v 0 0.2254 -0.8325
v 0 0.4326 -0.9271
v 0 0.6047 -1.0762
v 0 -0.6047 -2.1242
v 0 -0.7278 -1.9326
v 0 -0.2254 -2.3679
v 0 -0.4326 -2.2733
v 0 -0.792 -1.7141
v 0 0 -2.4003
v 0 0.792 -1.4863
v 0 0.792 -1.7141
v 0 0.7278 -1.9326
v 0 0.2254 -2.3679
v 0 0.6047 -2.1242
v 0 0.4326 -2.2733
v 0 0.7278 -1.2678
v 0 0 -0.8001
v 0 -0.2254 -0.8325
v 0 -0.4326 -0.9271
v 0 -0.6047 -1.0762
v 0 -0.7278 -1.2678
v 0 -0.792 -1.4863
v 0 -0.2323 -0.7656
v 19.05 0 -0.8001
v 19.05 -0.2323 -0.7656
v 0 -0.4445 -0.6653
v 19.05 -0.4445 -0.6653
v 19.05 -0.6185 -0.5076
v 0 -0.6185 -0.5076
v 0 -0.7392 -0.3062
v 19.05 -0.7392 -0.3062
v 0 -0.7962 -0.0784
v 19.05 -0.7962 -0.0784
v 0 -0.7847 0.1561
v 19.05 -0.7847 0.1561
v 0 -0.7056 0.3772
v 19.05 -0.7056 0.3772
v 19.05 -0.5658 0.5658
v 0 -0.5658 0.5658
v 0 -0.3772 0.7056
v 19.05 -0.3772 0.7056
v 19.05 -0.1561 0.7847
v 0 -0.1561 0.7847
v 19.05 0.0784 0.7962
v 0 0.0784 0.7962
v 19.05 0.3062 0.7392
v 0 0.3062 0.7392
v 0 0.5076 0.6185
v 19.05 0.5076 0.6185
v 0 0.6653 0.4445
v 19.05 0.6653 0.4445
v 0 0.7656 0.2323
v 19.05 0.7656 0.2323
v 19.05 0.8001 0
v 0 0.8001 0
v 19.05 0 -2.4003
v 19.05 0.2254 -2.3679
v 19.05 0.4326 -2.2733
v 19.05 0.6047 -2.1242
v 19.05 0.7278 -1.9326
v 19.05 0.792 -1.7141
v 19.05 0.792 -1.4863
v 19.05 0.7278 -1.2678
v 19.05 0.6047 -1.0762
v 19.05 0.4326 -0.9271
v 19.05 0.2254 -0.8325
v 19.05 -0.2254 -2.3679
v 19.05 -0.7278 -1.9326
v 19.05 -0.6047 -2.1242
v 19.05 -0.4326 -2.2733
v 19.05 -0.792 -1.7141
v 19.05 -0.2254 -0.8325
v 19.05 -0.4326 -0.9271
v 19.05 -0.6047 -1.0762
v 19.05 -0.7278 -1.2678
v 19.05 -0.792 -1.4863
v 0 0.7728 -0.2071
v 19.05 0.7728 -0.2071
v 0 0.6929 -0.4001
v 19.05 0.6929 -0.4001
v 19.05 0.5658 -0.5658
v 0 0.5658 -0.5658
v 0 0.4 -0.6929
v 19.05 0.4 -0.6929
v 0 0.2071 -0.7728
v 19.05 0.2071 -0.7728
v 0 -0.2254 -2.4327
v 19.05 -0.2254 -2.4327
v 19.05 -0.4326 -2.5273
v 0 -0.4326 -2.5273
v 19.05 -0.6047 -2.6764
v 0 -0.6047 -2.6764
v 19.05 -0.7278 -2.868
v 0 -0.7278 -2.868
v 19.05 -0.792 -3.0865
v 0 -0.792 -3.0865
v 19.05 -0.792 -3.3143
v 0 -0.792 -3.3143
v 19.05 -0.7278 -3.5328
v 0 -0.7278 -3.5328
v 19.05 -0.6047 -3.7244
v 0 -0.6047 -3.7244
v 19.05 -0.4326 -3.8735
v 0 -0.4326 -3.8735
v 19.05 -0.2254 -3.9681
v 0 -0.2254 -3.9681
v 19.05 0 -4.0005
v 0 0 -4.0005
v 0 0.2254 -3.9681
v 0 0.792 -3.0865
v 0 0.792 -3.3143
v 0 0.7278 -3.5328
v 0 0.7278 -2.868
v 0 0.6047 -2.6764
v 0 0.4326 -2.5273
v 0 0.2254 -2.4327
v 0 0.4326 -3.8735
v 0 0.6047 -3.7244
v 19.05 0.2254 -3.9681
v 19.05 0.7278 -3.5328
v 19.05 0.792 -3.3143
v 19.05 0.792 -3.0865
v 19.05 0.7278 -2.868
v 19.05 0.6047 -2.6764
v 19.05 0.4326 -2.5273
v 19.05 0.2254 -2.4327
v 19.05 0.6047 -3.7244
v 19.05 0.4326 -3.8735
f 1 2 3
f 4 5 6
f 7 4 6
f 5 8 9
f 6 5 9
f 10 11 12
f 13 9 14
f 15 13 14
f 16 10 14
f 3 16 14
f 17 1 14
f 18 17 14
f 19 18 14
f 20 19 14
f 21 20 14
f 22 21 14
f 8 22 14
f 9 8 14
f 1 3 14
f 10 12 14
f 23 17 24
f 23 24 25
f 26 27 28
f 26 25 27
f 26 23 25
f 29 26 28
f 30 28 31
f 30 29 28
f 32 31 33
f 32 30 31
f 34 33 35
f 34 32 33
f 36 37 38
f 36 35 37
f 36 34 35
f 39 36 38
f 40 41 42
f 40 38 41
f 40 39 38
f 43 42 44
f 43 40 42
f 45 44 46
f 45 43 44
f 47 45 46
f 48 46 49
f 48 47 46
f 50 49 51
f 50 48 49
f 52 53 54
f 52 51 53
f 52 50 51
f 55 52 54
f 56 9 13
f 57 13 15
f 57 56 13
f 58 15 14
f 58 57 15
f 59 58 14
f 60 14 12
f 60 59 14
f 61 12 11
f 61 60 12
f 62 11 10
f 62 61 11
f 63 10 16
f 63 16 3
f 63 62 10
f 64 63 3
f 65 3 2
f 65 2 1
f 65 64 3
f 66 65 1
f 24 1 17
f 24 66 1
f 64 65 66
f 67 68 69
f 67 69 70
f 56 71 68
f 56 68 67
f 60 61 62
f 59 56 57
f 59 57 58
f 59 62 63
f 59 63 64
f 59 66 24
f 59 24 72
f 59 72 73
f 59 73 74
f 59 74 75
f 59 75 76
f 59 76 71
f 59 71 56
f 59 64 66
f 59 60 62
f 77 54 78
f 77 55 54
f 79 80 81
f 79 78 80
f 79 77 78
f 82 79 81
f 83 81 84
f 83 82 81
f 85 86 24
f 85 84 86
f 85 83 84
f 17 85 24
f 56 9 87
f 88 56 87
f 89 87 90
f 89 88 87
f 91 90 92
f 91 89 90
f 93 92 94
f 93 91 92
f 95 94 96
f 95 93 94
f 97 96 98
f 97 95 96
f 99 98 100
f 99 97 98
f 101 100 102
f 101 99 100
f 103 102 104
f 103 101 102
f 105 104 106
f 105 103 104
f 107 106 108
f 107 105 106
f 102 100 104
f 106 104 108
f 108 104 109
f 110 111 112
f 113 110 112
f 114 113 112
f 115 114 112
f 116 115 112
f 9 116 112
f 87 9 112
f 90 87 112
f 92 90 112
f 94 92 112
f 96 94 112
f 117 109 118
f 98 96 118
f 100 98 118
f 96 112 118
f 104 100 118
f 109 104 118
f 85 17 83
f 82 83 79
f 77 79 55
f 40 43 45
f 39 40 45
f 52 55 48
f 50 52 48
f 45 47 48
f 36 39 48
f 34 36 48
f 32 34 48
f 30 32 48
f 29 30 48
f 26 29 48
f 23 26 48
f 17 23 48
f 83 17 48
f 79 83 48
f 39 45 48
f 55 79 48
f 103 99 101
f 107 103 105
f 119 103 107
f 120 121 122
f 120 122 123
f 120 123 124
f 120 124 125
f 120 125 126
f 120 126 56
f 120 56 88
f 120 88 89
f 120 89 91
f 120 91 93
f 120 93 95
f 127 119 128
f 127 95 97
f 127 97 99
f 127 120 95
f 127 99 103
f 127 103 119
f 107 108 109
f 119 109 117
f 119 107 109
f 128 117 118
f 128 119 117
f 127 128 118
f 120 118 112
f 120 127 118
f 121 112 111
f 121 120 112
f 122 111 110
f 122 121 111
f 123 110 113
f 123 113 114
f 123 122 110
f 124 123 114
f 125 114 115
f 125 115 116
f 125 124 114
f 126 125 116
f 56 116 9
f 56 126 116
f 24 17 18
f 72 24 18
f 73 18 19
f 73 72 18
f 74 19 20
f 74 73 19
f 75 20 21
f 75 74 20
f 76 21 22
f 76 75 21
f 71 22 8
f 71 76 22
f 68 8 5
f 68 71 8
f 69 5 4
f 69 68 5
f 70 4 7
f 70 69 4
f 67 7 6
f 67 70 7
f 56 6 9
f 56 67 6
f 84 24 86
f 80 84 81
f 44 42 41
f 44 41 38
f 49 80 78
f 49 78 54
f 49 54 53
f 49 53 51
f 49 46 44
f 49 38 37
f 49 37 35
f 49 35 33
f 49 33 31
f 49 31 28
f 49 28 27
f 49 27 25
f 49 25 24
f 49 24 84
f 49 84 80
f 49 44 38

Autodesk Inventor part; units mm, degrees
ref_plane "YZ Plane" through (0, 0, 0) normal (1, 0, 0) x (0, 1, 0)
ref_plane "XZ Plane" through (0, 0, 0) normal (0, 1, 0) x (-1, 0, 0)
ref_plane "XY Plane" through (0, 0, 0) normal (0, 0, 1) x (1, 0, 0)
sketch "Sketch1" plane through (0, 0, 0) normal (1, 0, 0) x (0, 1, 0)
  circle A0 centre (0, 0) radius 0.8001
  dimension "d0" = 1.6002
extrude "Extrusion1" add sketch "Sketch1" along normal blind 19.05
sketch "Sketch2" plane through (19.05, 0, 0) normal (1, 0, 0) x (0, 0, -1)
  circle A0 centre (1.6002, 0) radius 0.8001
  circle A1 centre (0, 0) radius 0.8001 projected
  dimension "d3" = 1.6002
extrude "Extrusion2" add sketch "Sketch2" against normal blind 19.05 contours A0
sketch "Sketch3" plane through (19.05, 0, -1.6002) normal (1, 0, 0) x (0, 0, -1)
  circle A0 centre (1.6002, 0) radius 0.8001
  circle A1 centre (0, 0) radius 0.8001 projected
  point P0 (-0.8001, 0)
  dimension "d6" = 1.6002
extrude "Extrusion3" add sketch "Sketch3" against normal blind 19.05 contours A0
properties material "Copper"
